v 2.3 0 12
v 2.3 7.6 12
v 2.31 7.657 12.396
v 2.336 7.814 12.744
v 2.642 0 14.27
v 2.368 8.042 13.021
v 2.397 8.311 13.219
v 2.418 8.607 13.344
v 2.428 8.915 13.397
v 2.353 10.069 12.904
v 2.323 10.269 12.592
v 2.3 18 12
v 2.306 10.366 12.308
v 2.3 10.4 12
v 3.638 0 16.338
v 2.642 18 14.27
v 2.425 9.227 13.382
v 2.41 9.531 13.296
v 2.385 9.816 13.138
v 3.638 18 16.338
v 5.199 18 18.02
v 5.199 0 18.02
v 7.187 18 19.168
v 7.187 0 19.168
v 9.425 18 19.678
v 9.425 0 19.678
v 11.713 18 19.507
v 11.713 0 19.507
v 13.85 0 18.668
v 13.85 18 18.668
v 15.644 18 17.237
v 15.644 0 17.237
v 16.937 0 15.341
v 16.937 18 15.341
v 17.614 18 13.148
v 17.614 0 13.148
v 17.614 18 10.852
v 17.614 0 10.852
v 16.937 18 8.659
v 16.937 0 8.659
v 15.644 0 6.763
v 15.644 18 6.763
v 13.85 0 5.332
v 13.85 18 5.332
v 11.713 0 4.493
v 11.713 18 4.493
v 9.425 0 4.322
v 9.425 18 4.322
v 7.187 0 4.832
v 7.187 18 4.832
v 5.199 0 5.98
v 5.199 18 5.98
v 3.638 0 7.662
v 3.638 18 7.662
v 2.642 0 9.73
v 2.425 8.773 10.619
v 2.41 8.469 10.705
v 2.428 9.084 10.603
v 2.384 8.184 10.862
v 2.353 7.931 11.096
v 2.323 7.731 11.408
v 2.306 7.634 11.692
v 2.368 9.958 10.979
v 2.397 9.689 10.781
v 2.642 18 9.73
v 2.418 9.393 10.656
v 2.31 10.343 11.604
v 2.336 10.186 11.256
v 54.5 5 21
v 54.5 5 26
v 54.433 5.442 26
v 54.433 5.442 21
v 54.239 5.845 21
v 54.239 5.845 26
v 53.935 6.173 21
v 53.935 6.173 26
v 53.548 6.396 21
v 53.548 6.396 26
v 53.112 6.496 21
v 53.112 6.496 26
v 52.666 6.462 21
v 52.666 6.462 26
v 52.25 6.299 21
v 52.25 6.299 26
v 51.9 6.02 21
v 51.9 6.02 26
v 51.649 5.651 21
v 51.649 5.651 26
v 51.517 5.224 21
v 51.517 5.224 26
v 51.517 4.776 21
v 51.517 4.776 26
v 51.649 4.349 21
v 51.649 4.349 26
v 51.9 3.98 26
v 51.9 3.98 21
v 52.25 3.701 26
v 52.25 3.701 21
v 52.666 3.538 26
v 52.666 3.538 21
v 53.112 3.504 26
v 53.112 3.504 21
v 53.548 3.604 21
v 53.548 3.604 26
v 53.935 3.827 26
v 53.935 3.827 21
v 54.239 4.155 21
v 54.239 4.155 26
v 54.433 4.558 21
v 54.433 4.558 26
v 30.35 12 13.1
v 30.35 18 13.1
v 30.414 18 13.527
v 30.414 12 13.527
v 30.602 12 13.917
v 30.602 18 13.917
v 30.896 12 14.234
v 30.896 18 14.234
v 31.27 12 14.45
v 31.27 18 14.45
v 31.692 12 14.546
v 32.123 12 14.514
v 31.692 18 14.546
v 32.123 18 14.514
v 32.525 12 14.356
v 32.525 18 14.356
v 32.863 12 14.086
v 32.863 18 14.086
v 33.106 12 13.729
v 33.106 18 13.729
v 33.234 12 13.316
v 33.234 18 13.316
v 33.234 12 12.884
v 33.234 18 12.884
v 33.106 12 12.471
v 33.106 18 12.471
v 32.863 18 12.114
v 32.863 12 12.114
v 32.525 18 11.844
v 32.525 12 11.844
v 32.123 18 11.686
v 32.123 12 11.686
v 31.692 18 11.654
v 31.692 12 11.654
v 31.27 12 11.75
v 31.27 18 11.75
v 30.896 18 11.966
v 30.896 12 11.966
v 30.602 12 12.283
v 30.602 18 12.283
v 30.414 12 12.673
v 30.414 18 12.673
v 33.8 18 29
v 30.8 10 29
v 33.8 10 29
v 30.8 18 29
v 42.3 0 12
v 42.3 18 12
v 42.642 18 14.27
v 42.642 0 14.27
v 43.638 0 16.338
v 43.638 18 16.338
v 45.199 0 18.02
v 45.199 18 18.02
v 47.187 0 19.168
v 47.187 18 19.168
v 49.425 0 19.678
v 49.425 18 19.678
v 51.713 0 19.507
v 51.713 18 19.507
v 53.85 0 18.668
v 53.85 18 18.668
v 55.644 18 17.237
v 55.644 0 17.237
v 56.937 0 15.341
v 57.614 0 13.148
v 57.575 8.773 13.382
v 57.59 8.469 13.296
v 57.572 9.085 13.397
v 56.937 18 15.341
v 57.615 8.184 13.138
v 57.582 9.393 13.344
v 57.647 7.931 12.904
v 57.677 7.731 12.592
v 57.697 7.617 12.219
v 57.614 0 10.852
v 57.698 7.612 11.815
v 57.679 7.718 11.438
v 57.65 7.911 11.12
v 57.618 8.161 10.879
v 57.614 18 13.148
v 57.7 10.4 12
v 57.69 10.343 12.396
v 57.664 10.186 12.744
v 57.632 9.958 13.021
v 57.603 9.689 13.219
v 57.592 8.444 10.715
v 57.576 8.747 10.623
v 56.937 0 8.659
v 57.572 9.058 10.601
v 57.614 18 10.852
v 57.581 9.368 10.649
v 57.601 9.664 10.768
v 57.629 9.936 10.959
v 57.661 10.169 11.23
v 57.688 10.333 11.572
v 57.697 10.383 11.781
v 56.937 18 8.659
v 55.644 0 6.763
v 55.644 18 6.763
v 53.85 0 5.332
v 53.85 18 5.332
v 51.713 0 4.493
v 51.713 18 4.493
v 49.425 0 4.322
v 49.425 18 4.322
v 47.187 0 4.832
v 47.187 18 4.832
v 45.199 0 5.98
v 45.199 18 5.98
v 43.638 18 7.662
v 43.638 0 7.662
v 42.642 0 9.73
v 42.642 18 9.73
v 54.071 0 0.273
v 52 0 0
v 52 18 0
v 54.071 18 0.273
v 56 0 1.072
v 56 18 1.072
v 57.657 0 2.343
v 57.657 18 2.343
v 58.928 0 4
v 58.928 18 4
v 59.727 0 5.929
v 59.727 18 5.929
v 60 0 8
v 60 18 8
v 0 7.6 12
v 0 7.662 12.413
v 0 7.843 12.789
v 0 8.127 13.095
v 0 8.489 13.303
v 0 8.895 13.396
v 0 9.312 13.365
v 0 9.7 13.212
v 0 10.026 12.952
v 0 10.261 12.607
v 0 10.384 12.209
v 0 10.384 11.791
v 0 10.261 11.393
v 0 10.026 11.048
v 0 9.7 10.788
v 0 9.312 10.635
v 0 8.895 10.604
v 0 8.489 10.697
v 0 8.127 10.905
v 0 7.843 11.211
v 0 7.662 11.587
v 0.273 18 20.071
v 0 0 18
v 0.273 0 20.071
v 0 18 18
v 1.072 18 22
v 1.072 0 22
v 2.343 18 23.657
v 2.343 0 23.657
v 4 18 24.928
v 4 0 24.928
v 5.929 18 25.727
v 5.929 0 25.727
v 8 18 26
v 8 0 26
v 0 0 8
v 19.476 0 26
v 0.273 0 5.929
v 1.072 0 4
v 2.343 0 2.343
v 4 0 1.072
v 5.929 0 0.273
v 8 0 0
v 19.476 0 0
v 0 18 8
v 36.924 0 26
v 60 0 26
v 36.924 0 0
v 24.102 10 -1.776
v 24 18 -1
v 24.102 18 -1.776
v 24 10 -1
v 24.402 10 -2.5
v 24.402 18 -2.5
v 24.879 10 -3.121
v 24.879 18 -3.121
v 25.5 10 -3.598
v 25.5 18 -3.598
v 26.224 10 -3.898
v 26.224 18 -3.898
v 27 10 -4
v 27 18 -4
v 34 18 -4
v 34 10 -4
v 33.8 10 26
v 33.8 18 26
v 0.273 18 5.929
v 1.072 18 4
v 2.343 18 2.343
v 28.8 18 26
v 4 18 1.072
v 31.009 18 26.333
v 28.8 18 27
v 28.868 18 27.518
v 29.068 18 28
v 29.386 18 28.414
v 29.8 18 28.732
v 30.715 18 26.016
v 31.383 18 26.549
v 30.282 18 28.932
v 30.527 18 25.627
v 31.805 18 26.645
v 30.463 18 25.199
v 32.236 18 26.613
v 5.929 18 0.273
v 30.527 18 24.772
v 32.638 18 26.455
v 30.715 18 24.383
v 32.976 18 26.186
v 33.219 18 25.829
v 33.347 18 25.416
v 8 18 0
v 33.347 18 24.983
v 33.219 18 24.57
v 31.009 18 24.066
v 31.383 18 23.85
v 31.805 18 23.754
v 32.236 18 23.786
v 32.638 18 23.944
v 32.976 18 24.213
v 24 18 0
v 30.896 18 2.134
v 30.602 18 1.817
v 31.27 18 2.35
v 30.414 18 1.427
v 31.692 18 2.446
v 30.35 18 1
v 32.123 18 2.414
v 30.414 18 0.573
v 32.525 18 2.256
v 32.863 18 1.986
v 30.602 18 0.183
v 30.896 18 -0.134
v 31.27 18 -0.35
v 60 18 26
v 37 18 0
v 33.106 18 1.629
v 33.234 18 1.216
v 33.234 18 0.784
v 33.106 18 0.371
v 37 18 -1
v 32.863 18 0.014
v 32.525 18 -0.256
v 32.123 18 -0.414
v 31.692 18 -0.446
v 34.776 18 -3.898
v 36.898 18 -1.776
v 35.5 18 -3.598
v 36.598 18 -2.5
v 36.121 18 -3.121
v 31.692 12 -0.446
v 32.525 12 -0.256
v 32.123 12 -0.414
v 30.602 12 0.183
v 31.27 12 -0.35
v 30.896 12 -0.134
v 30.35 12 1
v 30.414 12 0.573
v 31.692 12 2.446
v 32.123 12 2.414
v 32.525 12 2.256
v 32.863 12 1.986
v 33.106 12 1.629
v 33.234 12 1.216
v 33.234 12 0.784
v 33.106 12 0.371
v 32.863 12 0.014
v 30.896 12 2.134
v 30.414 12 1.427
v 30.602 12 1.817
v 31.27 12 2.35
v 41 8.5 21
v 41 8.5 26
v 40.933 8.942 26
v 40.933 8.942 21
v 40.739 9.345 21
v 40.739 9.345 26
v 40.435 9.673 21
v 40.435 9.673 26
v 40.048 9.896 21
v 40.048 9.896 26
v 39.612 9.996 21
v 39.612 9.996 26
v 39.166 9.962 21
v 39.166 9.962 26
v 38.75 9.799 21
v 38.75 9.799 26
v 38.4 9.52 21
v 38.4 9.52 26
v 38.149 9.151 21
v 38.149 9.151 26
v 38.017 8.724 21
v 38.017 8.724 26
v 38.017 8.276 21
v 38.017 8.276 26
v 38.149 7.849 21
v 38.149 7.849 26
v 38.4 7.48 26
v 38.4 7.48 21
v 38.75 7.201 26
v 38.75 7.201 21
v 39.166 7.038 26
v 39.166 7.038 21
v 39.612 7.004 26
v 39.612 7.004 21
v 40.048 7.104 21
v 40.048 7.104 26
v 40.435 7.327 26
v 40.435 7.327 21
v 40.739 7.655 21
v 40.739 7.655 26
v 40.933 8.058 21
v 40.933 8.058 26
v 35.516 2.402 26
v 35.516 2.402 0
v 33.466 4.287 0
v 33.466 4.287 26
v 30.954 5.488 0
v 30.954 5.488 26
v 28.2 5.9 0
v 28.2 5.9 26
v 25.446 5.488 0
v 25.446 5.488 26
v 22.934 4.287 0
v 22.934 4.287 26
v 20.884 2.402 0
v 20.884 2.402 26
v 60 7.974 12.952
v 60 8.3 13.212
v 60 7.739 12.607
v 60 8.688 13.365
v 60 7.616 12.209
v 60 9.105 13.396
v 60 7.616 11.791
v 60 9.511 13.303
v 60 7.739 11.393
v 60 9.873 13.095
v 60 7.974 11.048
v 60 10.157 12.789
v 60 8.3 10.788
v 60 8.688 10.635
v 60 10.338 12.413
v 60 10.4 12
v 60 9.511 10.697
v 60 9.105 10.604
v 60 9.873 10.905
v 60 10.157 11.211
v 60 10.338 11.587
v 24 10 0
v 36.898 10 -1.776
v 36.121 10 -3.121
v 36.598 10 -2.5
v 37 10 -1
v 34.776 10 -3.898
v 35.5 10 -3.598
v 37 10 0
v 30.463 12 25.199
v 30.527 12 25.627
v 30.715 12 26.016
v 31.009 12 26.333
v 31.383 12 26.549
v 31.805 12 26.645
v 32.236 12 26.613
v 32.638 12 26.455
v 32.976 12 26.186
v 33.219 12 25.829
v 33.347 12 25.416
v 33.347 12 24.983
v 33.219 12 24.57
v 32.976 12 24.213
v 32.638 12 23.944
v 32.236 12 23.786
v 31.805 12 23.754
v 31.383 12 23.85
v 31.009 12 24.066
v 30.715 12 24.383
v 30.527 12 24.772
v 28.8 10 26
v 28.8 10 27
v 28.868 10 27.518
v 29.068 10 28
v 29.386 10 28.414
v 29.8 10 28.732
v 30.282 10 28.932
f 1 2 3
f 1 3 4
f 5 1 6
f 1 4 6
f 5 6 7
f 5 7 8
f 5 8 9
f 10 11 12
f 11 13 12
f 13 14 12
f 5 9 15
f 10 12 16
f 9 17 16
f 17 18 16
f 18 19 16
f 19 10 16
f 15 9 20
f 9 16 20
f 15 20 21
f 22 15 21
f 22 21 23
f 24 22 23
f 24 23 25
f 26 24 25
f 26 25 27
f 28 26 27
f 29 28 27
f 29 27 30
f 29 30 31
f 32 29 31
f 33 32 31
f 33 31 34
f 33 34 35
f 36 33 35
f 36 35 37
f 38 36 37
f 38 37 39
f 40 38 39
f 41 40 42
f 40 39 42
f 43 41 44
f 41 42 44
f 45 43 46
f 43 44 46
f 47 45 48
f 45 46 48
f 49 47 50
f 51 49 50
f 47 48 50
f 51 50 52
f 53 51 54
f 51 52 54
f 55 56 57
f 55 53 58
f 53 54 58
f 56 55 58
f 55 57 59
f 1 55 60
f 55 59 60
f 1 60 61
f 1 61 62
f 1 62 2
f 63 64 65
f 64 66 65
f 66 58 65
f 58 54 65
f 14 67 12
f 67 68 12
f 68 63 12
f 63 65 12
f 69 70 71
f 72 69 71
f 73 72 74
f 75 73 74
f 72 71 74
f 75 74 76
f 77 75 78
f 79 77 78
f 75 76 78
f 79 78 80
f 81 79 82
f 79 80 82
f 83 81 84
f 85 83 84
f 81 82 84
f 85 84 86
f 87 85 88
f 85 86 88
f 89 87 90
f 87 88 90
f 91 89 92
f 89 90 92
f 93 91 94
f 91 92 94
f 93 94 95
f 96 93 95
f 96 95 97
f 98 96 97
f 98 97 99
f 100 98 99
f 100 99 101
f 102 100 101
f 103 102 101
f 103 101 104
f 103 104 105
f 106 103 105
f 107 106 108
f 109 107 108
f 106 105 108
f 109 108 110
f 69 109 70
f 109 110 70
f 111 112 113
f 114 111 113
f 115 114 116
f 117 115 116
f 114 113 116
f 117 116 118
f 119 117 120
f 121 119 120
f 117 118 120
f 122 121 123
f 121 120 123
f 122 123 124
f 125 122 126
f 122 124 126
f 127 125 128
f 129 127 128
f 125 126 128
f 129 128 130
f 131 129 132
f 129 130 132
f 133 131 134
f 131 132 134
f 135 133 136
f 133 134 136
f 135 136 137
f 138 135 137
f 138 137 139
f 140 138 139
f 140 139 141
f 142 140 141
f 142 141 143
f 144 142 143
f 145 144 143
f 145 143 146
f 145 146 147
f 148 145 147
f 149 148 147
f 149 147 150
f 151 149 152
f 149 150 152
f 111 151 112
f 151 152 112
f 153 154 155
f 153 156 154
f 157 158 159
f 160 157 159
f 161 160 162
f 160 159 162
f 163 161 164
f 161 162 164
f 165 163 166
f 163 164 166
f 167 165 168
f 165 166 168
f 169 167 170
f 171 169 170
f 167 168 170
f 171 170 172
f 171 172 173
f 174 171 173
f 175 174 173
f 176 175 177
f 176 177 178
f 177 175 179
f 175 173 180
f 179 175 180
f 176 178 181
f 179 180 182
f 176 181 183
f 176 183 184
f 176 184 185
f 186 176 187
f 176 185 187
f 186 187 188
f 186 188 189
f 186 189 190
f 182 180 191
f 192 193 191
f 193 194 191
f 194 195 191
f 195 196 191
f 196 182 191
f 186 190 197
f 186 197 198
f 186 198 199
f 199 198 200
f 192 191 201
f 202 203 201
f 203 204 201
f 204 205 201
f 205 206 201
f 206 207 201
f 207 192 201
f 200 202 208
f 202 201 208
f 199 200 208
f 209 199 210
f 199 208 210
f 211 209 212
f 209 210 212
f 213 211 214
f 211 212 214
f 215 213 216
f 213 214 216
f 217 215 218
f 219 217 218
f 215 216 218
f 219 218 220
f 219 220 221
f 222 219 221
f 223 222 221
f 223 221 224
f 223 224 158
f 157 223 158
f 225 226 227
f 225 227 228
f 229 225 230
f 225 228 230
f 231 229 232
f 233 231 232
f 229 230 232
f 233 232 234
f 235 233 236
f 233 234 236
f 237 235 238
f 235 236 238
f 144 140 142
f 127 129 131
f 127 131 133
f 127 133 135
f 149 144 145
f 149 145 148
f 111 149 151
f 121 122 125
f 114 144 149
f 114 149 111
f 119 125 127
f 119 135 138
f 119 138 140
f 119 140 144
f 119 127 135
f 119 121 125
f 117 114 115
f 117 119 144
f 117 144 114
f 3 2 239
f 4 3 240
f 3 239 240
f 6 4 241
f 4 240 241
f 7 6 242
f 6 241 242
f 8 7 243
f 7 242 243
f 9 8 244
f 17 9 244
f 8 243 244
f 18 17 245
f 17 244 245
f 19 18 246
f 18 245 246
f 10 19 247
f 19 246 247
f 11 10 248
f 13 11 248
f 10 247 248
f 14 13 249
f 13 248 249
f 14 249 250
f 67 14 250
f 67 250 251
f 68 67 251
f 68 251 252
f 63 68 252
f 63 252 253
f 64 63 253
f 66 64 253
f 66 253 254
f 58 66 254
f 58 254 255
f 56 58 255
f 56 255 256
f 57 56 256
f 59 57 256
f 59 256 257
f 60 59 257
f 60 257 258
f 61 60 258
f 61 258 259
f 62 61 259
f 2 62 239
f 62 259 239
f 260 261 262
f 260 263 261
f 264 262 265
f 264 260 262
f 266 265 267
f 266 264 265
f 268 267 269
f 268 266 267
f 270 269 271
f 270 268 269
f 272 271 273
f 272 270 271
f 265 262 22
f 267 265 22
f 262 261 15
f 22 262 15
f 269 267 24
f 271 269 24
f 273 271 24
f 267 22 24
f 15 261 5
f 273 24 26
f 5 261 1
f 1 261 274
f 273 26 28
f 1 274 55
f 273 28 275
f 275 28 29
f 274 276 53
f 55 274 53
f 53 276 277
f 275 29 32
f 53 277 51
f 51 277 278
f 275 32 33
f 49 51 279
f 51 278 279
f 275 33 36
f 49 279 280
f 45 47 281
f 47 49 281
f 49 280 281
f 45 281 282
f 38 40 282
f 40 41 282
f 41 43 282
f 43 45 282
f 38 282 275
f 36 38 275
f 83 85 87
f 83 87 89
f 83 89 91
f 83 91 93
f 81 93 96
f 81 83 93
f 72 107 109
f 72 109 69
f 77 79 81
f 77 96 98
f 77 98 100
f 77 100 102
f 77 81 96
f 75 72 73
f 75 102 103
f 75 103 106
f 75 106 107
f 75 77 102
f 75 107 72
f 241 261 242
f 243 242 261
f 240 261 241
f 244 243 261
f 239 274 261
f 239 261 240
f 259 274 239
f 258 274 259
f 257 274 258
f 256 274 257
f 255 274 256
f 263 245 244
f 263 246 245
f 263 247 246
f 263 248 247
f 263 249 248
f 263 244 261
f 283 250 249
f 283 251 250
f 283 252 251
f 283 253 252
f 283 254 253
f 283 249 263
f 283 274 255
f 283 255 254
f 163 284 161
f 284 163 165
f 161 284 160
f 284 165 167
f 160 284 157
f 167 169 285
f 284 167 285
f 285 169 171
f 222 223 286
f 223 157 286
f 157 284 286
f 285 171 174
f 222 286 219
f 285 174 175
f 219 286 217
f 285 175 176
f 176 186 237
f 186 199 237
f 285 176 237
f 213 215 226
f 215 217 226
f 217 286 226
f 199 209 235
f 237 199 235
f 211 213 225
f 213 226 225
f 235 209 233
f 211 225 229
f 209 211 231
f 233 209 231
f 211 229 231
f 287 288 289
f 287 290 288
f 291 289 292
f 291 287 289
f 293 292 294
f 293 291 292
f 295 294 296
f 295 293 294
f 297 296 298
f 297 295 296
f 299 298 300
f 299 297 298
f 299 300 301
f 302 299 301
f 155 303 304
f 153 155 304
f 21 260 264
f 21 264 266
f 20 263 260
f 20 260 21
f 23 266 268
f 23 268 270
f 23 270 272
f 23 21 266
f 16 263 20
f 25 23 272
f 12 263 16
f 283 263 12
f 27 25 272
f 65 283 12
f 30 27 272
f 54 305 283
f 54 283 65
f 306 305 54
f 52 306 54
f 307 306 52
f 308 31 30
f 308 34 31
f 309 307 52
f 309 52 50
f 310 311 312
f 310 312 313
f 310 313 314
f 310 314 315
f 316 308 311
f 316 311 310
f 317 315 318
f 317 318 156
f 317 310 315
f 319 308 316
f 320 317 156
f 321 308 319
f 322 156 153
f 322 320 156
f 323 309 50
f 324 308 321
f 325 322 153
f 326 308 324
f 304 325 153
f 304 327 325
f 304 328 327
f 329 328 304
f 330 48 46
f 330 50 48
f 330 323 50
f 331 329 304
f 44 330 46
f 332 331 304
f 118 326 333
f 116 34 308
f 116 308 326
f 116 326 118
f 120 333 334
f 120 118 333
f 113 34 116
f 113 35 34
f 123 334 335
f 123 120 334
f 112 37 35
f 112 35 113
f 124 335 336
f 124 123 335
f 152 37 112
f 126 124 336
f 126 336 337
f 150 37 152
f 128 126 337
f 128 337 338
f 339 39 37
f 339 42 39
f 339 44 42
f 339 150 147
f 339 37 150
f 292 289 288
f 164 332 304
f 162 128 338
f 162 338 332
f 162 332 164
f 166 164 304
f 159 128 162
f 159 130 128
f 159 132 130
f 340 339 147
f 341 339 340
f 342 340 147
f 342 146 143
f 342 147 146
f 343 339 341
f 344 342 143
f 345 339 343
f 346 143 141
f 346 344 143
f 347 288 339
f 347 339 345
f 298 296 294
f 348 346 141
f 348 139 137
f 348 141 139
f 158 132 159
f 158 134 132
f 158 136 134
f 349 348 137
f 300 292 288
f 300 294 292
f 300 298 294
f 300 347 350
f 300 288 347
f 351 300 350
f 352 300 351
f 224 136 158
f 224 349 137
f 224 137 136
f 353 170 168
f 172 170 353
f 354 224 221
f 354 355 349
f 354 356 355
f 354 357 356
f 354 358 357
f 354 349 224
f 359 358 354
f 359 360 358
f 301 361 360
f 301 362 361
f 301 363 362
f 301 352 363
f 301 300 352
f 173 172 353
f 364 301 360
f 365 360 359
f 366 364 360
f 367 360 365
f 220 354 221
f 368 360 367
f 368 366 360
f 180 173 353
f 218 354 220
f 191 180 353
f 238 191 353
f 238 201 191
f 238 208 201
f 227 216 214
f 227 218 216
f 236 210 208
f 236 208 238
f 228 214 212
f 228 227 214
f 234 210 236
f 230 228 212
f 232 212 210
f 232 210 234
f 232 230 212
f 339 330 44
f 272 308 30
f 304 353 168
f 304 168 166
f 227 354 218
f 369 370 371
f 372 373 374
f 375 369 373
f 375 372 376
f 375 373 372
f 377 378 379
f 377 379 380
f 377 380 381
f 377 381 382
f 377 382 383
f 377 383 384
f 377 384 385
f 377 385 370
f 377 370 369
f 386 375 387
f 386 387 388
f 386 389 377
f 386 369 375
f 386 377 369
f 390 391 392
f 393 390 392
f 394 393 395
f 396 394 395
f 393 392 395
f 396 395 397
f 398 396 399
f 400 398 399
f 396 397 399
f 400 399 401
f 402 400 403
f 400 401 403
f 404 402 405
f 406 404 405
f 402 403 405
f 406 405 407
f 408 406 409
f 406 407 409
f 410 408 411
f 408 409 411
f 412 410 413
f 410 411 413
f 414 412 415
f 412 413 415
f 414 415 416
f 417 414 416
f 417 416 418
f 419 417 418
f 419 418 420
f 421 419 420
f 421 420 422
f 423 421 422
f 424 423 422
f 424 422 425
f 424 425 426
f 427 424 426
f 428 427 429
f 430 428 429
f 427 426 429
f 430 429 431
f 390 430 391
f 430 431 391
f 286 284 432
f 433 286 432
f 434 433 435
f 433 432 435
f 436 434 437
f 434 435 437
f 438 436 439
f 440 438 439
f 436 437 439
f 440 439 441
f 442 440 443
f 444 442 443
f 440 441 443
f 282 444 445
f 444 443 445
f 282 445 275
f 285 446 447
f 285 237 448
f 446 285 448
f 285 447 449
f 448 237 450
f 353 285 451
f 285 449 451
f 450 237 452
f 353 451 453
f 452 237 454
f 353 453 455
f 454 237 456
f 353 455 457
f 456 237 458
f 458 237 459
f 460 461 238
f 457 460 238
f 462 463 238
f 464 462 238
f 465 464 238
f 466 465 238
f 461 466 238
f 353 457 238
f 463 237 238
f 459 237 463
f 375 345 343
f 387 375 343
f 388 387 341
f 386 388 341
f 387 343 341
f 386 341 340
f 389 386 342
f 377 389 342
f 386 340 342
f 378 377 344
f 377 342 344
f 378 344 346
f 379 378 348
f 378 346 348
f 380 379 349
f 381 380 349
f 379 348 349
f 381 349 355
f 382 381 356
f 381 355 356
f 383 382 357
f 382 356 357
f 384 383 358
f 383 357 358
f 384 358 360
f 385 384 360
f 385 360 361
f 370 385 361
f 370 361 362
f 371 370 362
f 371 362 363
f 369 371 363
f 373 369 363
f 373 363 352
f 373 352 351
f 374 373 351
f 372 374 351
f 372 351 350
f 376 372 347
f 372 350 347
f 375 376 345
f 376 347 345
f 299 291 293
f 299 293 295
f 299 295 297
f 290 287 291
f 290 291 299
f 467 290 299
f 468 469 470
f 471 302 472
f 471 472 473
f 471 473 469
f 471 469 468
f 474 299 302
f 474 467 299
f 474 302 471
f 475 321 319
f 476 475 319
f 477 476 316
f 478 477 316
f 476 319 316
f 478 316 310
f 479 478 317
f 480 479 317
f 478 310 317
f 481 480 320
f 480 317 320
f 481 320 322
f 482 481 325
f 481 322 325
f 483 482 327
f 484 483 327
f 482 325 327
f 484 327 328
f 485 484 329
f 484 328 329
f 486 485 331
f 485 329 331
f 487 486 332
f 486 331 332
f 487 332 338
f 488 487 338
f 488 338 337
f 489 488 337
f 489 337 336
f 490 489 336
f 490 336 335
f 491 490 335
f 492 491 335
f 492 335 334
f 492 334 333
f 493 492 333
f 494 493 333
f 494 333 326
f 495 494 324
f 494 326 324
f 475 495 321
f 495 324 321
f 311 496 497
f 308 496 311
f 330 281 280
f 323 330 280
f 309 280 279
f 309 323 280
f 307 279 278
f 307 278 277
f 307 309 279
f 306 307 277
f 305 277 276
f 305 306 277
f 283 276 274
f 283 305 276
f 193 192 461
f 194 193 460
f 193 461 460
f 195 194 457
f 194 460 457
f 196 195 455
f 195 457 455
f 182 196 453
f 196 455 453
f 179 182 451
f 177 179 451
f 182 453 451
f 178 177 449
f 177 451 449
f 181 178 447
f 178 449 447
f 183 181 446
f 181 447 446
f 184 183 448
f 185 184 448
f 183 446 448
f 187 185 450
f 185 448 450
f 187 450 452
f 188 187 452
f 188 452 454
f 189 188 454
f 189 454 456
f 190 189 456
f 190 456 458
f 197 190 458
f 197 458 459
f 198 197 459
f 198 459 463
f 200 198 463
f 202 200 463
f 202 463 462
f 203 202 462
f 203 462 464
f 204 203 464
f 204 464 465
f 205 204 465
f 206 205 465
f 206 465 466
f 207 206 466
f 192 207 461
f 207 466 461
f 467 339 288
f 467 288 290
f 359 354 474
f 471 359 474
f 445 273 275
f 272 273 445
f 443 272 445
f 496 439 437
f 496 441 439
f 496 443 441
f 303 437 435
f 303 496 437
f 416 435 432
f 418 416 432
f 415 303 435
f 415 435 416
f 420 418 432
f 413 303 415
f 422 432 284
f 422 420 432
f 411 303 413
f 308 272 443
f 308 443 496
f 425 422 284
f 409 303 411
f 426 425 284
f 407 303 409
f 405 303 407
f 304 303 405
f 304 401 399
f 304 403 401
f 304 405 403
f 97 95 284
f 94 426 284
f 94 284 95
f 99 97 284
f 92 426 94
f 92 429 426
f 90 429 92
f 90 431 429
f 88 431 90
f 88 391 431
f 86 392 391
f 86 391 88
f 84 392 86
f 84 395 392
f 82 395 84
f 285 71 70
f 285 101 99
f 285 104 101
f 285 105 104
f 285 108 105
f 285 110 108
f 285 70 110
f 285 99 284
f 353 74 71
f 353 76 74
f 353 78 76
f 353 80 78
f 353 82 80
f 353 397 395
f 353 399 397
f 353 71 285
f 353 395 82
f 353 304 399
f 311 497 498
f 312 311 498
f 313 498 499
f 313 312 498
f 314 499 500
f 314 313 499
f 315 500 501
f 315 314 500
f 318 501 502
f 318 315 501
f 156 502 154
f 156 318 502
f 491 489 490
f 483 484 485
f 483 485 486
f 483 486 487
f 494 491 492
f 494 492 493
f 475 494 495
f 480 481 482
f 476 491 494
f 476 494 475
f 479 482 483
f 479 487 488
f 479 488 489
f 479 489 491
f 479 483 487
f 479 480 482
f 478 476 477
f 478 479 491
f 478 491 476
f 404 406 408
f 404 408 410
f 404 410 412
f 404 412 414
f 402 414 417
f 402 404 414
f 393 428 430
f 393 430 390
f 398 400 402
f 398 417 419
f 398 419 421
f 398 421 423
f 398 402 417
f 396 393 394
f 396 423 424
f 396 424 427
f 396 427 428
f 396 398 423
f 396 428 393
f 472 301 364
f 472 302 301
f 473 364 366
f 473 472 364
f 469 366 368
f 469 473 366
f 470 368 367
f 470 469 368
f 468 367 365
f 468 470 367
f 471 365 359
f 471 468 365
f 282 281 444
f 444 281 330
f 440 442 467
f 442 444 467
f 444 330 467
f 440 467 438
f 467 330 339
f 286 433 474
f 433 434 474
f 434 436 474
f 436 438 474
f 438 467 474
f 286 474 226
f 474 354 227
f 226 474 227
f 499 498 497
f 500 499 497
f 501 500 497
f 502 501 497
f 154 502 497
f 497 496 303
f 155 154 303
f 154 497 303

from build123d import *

# Parameters (mm, degrees)
BOX001_W        = 60
BOX001_H        = 18
BOX001_DEPTH    = 26
SKETCH009_R     = 7.7
POCKET007_DEPTH = 21
SKETCH010_R     = 1.4
POCKET008_DEPTH = 5
SKETCH011_R     = 1.5
POCKET009_DEPTH = 5
SKETCH012_R     = 1.4
POCKET010_DEPTH = 5
SKETCH019_W     = 13
SKETCH019_H     = 8
PAD002_DEPTH    = 4
SKETCH020_W     = 5
SKETCH020_H     = 8
PAD003_DEPTH    = 3
SKETCH016_R     = 9.4
POCKET017_DEPTH = 30.001
SKETCH014_R     = 1.45
POCKET018_DEPTH = 6
FILLET003_R     = 2
FILLET004_R     = 3
FILLET005_R     = 8


with BuildPart() as part:
    # Box001 → Box001 (new body)
    with BuildSketch(Plane.XY):
        with Locations((30, 9)):
            Rectangle(BOX001_W, BOX001_H)
    extrude(amount=BOX001_DEPTH)

    # Sketch009 → Pocket007 (cut)
    with BuildSketch(Plane(origin=(0, 18, 0), x_dir=(-1, 0, 0), z_dir=(0, 1, 0))):
        with Locations((-50, 12)):
            Circle(SKETCH009_R)
        with Locations((-10, 12)):
            Circle(SKETCH009_R)
    extrude(amount=-POCKET007_DEPTH, mode=Mode.SUBTRACT)

    # Sketch010 → Pocket008 (cut)
    with BuildSketch(Plane.YZ.offset(60)):
        with Locations((9, 12)):
            Circle(SKETCH010_R)
    extrude(amount=-POCKET008_DEPTH, mode=Mode.SUBTRACT)

    # Sketch011 → Pocket009 (cut)
    with BuildSketch(Plane.XY.offset(26)):
        with Locations((39.5, 8.5)):
            Circle(SKETCH011_R)
        with Locations((53, 5)):
            Circle(SKETCH011_R)
    extrude(amount=-POCKET009_DEPTH, mode=Mode.SUBTRACT)

    # Sketch012 → Pocket010 (cut)
    with BuildSketch(Plane(origin=(0, 0, 0), x_dir=(0, -1, 0), z_dir=(-1, 0, 0))):
        with Locations((-9, 12)):
            Circle(SKETCH012_R)
    extrude(amount=-POCKET010_DEPTH, mode=Mode.SUBTRACT)

    # Sketch019 → Pad002 (new body)
    with BuildSketch(Plane(origin=(0, 0, 0), x_dir=(1, 0, 0), z_dir=(0, 0, -1))):
        with Locations((30.5, -14)):
            Rectangle(SKETCH019_W, SKETCH019_H)
    extrude(amount=PAD002_DEPTH)

    # Sketch020 → Pad003 (new body)
    with BuildSketch(Plane.XY.offset(26)):
        with Locations((31.3, 14)):
            Rectangle(SKETCH020_W, SKETCH020_H)
    extrude(amount=PAD003_DEPTH)

    # Sketch016 → Pocket017 (cut, through all)
    with BuildSketch(Plane.XY.offset(26)):
        with Locations((28.2, -3.5)):
            Circle(SKETCH016_R)
    extrude(amount=-POCKET017_DEPTH, mode=Mode.SUBTRACT)

    # Sketch014 → Pocket018 (cut)
    with BuildSketch(Plane(origin=(0, 18, 0), x_dir=(-1, 0, 0), z_dir=(0, 1, 0))):
        with Locations((-31.8, 13.1)):
            Circle(SKETCH014_R)
        with Locations((-31.8, 1)):
            Circle(SKETCH014_R)
        with Locations((-31.912905, 25.199473)):
            Circle(SKETCH014_R)
    extrude(amount=-POCKET018_DEPTH, mode=Mode.SUBTRACT)

    # Fillet003
    fillet003_edges = [part.edges().sort_by_distance(p)[0] for p in [
        (28.8, 14, 29),
    ]]
    fillet(fillet003_edges, radius=FILLET003_R)

    # Fillet004
    fillet004_edges = [part.edges().sort_by_distance(p)[0] for p in [
        (24, 14, -4),
        (37, 14, -4),
    ]]
    fillet(fillet004_edges, radius=FILLET004_R)

    # Fillet005
    fillet005_edges = [part.edges().sort_by_distance(p)[0] for p in [
        (60, 9, 0),
        (0, 9, 26),
        (0, 9, 0),
    ]]
    fillet(fillet005_edges, radius=FILLET005_R)


solid = part.part
